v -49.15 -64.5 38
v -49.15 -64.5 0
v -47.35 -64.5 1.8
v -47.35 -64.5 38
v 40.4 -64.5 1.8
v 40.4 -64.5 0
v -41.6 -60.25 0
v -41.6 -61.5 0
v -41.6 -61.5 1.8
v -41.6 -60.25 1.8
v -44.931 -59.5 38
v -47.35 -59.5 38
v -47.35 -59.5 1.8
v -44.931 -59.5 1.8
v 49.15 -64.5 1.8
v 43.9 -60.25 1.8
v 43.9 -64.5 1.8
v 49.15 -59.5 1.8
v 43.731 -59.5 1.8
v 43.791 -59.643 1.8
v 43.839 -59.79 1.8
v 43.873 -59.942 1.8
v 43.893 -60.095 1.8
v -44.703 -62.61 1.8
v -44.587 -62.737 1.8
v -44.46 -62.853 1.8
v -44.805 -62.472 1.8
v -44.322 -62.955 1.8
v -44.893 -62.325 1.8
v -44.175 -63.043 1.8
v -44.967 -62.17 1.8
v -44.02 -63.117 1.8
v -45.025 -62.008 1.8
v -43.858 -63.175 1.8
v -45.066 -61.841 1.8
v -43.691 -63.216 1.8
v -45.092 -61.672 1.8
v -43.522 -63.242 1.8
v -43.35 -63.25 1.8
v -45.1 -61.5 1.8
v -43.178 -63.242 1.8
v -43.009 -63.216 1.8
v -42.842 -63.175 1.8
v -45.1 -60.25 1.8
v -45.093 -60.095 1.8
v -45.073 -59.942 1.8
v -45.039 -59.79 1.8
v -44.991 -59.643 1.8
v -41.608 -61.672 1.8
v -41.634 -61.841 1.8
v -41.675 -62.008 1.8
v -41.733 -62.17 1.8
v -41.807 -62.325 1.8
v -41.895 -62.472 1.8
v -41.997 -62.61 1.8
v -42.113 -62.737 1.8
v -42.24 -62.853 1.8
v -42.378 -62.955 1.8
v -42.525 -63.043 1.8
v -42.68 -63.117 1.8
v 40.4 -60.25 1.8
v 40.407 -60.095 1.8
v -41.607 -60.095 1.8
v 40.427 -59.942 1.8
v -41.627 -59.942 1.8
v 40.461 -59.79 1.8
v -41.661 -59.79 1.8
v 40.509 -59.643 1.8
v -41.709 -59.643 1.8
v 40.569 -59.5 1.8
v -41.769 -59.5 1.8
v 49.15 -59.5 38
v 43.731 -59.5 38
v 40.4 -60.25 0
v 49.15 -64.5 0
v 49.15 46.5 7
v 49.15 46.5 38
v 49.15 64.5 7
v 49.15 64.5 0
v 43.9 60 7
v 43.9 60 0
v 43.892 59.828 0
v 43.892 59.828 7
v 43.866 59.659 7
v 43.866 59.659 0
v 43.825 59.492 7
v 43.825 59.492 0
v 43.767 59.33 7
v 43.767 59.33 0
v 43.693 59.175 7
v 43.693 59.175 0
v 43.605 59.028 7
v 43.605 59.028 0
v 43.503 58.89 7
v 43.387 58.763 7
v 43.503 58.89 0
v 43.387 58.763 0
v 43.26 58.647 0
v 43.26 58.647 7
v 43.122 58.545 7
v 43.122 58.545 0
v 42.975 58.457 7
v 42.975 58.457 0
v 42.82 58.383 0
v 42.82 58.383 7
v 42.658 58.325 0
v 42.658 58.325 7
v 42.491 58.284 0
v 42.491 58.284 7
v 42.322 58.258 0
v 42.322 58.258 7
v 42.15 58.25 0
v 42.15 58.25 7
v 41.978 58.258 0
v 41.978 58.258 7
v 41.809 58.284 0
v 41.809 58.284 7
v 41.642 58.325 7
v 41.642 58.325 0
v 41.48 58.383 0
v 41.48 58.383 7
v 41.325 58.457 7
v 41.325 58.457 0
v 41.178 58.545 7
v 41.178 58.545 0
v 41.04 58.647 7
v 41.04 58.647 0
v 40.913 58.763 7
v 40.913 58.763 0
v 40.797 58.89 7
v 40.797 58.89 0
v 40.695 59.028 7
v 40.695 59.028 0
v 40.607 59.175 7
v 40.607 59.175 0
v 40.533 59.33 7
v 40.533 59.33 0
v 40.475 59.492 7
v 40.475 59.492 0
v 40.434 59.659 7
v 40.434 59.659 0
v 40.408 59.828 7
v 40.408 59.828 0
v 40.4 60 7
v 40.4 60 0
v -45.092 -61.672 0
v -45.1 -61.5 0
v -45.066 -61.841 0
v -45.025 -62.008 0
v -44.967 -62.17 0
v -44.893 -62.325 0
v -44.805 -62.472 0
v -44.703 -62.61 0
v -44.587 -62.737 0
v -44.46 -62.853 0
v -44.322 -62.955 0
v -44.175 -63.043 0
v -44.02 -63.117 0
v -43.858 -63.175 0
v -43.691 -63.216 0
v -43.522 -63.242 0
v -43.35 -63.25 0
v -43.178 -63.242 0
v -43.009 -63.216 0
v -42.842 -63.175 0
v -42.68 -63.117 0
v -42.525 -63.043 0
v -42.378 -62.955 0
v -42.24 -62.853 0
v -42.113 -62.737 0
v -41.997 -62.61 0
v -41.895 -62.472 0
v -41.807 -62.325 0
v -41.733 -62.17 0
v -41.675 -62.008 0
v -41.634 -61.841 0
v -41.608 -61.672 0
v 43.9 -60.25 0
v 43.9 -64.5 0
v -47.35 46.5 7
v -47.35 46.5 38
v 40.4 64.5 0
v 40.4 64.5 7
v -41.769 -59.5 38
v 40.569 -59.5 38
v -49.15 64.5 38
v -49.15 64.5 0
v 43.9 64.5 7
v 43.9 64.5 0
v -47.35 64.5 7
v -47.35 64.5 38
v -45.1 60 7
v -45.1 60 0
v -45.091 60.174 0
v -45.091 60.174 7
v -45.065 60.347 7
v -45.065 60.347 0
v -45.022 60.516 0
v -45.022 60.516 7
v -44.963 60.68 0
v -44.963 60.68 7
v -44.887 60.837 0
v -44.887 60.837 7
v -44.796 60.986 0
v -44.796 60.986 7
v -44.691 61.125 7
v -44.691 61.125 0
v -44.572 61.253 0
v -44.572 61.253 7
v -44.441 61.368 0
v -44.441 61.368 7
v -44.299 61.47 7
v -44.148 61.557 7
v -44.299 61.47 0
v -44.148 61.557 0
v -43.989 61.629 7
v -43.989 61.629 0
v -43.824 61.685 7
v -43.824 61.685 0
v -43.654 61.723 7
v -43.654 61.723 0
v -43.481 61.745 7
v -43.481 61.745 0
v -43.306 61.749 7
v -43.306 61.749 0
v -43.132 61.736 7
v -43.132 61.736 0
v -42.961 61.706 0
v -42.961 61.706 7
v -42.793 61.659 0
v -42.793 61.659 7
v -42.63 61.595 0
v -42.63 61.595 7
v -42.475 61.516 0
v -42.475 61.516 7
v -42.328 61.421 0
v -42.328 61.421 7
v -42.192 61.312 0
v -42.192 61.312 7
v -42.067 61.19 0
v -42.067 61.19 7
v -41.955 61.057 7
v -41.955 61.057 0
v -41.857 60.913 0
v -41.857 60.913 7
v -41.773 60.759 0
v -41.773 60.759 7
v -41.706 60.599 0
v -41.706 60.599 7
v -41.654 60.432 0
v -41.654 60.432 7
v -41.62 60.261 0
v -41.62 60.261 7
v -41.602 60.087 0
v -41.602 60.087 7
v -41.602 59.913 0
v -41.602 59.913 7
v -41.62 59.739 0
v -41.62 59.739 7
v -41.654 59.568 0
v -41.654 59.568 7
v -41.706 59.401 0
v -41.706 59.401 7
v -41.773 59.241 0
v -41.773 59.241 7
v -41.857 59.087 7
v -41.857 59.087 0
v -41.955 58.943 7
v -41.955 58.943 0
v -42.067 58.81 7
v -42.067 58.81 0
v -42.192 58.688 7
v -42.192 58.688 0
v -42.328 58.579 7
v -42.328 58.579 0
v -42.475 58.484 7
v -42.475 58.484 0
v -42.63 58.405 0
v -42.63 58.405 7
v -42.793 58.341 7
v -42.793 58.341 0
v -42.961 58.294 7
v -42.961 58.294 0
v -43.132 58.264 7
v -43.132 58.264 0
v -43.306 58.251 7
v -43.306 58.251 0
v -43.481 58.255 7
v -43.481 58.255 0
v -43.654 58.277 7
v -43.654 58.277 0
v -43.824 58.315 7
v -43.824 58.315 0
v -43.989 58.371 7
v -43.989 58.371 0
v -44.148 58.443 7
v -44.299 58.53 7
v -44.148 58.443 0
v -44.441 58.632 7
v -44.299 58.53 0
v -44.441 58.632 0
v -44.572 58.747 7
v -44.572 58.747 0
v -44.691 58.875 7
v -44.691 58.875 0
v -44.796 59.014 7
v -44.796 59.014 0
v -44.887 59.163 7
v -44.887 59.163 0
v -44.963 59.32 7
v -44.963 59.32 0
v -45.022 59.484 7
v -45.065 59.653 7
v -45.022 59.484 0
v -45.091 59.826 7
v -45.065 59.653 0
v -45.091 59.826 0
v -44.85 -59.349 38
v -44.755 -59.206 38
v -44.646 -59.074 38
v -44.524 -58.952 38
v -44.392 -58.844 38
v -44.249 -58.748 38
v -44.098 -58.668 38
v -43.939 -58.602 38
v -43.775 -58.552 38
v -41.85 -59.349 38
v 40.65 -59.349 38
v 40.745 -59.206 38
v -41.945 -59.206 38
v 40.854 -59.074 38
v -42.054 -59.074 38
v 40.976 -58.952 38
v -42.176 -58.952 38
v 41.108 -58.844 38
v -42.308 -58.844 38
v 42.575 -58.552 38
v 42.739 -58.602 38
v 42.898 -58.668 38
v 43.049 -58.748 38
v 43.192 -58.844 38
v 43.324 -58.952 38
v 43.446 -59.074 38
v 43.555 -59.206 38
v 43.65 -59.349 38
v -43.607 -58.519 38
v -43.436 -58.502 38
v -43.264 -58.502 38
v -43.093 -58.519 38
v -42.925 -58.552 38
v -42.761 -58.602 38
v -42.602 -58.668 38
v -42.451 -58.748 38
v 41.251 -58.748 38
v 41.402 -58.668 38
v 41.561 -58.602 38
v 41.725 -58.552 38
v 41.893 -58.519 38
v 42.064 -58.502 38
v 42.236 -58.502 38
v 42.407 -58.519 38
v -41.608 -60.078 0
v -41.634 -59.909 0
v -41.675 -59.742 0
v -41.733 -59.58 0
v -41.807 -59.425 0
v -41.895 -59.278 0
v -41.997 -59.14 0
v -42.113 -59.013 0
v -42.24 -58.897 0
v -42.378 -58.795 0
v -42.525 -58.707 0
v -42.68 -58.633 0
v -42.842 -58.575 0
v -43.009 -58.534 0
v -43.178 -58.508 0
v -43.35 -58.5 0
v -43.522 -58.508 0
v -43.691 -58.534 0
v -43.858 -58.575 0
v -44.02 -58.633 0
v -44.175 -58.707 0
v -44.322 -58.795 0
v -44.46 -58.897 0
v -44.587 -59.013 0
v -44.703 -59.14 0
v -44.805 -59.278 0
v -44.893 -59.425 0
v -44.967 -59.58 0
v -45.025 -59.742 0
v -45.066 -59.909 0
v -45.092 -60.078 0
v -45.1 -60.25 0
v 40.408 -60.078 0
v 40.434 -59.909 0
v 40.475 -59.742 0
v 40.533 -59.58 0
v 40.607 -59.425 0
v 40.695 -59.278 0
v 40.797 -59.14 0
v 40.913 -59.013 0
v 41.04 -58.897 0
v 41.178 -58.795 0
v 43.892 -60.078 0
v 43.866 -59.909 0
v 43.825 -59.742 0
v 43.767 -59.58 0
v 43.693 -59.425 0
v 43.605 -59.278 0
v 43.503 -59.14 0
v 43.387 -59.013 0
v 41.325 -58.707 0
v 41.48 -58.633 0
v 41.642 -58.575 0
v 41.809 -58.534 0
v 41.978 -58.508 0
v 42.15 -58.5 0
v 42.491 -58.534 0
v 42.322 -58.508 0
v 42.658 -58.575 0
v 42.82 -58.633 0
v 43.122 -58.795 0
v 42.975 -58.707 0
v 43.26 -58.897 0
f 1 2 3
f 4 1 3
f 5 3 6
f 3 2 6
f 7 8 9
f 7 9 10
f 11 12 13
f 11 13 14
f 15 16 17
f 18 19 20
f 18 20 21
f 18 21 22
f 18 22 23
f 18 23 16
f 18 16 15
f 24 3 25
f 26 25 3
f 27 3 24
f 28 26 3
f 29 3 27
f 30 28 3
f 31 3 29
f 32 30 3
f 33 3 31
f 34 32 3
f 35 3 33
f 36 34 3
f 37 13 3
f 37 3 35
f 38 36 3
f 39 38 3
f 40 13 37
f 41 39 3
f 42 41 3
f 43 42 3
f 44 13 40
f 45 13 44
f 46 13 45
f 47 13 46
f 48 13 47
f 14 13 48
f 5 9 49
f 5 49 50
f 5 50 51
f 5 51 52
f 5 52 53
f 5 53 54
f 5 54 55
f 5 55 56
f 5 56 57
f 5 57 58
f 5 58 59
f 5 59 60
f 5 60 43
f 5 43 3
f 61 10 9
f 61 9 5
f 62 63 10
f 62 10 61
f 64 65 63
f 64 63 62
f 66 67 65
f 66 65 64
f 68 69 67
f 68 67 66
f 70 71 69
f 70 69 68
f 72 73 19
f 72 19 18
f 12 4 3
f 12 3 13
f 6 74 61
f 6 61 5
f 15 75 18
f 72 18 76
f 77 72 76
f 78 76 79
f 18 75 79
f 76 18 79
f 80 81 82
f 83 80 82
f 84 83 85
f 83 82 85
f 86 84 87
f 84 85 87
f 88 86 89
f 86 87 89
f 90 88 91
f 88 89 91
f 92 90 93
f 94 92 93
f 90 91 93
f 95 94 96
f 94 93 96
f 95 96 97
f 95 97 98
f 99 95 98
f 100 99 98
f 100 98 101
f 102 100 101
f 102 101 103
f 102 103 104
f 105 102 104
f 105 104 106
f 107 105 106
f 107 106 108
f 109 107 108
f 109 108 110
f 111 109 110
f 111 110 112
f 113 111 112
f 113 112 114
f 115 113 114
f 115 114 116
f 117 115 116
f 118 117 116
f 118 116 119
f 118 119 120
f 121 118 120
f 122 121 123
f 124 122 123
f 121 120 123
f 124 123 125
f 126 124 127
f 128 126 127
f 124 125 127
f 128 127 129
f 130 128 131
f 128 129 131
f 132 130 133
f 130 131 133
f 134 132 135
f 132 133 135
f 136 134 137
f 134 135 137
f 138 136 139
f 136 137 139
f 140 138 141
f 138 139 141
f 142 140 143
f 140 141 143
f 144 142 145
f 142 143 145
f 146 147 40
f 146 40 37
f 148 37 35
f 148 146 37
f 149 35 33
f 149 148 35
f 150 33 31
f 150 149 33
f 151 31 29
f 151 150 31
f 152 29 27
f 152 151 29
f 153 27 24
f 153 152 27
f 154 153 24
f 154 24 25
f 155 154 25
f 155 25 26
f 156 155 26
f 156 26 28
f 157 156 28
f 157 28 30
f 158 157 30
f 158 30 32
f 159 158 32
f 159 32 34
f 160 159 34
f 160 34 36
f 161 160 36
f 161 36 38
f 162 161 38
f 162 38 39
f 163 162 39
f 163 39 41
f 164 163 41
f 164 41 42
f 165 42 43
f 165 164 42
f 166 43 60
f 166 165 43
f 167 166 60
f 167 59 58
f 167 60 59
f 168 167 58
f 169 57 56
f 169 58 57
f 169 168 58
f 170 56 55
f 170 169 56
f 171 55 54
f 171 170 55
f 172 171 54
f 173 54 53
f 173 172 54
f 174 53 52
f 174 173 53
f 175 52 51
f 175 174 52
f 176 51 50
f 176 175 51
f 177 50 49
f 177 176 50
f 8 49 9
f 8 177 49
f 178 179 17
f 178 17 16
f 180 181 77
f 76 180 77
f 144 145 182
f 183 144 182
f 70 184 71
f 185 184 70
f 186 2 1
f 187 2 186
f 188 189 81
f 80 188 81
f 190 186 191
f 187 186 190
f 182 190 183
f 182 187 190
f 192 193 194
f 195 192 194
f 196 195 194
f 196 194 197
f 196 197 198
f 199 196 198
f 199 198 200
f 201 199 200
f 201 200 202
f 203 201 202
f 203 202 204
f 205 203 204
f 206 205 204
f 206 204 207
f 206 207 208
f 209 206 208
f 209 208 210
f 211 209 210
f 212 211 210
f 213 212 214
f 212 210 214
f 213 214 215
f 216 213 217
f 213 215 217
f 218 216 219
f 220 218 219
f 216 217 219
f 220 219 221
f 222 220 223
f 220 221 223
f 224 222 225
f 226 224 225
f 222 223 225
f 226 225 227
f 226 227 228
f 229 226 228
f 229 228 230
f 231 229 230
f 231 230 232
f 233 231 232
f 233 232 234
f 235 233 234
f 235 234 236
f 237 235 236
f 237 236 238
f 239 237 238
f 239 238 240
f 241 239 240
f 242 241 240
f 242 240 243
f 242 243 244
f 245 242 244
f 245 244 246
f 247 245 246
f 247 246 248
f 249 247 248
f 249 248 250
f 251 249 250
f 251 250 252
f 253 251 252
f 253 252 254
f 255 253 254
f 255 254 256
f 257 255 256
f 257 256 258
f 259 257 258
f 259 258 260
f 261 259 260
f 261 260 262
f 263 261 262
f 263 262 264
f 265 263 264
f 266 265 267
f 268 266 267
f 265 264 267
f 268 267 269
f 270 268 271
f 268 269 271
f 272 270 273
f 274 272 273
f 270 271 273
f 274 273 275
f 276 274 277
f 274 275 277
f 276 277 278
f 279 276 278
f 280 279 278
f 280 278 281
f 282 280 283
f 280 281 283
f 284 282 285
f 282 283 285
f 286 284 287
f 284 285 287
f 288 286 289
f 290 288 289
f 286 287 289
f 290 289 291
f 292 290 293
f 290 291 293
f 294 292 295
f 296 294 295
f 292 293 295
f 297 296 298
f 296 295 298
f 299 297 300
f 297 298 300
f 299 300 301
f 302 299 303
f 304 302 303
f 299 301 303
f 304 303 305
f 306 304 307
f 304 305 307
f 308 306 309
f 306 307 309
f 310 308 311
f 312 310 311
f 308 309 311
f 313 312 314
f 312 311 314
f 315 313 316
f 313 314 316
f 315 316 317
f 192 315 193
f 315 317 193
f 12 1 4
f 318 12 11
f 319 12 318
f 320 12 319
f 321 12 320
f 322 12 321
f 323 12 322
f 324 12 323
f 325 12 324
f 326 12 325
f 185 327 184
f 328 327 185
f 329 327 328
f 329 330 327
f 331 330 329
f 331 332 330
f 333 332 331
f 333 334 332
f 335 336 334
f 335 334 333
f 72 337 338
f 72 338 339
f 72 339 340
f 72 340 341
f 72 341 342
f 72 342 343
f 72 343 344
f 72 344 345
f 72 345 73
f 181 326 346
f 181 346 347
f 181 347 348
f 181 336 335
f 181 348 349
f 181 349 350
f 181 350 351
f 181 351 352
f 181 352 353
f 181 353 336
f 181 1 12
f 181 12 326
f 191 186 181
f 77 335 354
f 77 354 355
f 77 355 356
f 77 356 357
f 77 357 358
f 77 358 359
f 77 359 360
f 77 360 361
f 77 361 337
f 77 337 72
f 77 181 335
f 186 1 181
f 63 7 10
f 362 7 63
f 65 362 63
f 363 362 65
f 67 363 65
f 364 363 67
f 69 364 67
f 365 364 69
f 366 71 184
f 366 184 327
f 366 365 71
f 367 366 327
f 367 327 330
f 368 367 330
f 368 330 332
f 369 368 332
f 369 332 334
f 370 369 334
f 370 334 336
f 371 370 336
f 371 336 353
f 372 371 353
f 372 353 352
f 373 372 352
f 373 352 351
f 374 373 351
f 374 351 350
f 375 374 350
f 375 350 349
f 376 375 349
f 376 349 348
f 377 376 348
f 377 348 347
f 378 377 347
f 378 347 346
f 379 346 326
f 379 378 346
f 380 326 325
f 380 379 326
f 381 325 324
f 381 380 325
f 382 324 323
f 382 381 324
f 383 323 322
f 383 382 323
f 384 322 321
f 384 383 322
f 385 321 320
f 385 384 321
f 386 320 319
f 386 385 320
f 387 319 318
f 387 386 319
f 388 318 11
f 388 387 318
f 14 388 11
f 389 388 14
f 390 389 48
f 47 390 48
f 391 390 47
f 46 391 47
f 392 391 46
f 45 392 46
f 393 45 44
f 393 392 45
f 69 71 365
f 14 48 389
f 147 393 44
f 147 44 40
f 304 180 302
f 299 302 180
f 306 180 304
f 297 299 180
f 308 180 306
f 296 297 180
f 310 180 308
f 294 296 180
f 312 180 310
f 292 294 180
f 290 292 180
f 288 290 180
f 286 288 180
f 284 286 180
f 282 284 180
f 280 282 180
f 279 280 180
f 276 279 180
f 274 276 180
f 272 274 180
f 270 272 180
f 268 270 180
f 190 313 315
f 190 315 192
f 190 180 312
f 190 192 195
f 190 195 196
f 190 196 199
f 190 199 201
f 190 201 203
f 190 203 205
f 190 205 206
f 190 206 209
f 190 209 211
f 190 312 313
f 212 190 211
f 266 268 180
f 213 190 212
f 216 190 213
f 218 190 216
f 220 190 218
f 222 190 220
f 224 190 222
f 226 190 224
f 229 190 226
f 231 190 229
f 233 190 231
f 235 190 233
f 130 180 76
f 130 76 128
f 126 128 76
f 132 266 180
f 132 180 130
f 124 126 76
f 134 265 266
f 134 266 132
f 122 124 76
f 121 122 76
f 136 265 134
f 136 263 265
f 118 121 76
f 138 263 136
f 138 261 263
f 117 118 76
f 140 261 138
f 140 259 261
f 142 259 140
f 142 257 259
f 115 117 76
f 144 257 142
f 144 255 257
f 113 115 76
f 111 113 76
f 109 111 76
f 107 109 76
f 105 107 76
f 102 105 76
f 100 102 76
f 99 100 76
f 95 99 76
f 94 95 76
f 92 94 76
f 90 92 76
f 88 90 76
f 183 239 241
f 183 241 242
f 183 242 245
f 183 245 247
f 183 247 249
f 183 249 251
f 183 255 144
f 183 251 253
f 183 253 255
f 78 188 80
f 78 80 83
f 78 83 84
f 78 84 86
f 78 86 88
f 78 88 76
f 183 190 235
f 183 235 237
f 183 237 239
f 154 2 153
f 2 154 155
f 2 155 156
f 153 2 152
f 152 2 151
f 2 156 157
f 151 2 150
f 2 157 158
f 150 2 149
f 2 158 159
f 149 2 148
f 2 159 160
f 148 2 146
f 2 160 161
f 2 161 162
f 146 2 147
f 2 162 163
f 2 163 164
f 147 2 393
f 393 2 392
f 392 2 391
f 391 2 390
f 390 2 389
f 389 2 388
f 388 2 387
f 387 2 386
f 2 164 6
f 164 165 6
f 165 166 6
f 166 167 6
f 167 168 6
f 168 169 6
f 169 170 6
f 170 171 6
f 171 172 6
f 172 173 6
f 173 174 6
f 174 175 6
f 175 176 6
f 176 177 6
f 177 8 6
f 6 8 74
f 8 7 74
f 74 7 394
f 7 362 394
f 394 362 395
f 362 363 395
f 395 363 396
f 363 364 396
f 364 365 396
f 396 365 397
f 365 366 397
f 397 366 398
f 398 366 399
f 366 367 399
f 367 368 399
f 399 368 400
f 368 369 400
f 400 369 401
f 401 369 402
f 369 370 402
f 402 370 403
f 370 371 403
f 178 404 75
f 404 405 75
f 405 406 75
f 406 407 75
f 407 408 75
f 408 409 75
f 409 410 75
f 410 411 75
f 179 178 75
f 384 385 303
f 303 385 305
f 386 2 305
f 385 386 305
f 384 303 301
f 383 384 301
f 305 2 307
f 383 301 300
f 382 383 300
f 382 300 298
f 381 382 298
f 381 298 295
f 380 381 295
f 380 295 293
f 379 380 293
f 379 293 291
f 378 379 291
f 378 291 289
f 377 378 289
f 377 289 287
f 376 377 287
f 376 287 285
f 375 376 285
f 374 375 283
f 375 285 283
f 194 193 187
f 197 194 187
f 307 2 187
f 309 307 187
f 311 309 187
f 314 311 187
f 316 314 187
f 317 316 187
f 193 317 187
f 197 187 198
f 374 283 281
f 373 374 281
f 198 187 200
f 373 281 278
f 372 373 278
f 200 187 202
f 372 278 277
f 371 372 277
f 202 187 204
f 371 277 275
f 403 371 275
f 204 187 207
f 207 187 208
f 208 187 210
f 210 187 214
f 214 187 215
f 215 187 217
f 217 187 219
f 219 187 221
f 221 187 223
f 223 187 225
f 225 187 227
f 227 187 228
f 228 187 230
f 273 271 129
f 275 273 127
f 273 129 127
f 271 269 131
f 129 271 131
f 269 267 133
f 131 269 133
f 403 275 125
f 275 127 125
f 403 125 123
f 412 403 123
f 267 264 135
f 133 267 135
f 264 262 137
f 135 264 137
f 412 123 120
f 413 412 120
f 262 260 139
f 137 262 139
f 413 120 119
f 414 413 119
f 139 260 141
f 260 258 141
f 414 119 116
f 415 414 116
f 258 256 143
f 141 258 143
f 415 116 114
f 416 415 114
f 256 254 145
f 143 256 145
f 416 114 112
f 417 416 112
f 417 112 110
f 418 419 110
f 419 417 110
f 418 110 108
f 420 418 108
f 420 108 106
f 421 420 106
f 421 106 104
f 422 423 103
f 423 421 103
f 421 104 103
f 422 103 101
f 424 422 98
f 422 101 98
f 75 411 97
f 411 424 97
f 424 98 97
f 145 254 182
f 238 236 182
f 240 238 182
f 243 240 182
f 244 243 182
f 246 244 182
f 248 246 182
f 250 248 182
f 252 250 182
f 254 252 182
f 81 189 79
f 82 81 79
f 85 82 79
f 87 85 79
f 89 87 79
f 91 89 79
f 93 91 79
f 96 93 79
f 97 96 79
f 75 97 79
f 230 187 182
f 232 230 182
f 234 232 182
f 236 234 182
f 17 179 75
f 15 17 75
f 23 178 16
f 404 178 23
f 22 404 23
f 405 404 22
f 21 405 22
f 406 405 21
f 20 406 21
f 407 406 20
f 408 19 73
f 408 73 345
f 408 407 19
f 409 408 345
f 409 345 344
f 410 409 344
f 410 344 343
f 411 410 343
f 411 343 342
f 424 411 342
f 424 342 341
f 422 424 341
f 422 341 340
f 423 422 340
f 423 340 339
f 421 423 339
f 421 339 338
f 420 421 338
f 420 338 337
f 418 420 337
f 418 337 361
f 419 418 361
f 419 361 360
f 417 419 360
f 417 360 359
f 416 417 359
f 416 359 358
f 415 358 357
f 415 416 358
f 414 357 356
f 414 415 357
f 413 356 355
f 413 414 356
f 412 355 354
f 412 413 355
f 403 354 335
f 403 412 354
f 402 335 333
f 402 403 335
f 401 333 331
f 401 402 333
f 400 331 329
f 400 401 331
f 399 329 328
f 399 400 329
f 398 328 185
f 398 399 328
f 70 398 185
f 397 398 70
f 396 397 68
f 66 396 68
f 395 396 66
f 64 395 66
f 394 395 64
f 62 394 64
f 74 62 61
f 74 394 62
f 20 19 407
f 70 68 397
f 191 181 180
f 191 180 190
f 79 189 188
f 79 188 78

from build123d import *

# Parameters (mm, degrees)
SKETCH_1_W          = 98.3
SKETCH_1_H          = 129
EXTRUDE_1_DEPTH     = 38
SKETCH_2_W          = 96.5
SKETCH_2_H          = 18
CUT_EXTRUDE_1_DEPTH = 31
SKETCH_3_W          = 96.5
SKETCH_3_H          = 5
CUT_EXTRUDE_2_DEPTH = 36.2
SKETCH_4_R          = 1.75
CUT_EXTRUDE_3_DEPTH = 90.554299171


with BuildPart() as part:
    # 草图1 → 凸台-拉伸1 (new body)
    with BuildSketch(Plane.XY):
        Rectangle(SKETCH_1_W, SKETCH_1_H)
    extrude(amount=EXTRUDE_1_DEPTH)

    # 草图2 → 切除-拉伸1 (cut)
    with BuildSketch(Plane.XY.offset(38)):
        with Locations((0.9, 55.5)):
            Rectangle(SKETCH_2_W, SKETCH_2_H)
    extrude(amount=-CUT_EXTRUDE_1_DEPTH, mode=Mode.SUBTRACT)

    # 草图3 → 切除-拉伸2 (cut)
    with BuildSketch(Plane.XY.offset(38)):
        with Locations((0.9, -62)):
            Rectangle(SKETCH_3_W, SKETCH_3_H)
    extrude(amount=-CUT_EXTRUDE_2_DEPTH, mode=Mode.SUBTRACT)

    # 草图4 → 切除-拉伸3 (cut, through all)
    with BuildSketch(Plane(origin=(0, 0, 0), x_dir=(-1, 0, 0), z_dir=(0, 0, -1))):
        with Locations((43.35, 60)):
            Circle(SKETCH_4_R)
        with BuildLine():
            Line((-40.4, 60), (-40.4, 64.5))
            Line((-40.4, 64.5), (-43.9, 64.5))
            Line((-43.9, 64.5), (-43.9, 60))
            ThreePointArc((-43.9, 60), (-42.15, 58.25), (-40.4, 60))
        make_face()
        with BuildLine():
            Line((-40.4, -60.25), (-40.4, -64.5))
            Line((-40.4, -64.5), (-43.9, -64.5))
            Line((-43.9, -64.5), (-43.9, -60.25))
            ThreePointArc((-43.9, -60.25), (-42.15, -58.5), (-40.4, -60.25))
        make_face()
        with BuildLine():
            Line((41.6, -61.5), (41.6, -60.25))
            ThreePointArc((41.6, -60.25), (43.35, -58.5), (45.1, -60.25))
            Line((45.1, -60.25), (45.1, -61.5))
            ThreePointArc((45.1, -61.5), (43.35, -63.25), (41.6, -61.5))
        make_face()
    extrude(amount=-CUT_EXTRUDE_3_DEPTH, mode=Mode.SUBTRACT)


solid = part.part
